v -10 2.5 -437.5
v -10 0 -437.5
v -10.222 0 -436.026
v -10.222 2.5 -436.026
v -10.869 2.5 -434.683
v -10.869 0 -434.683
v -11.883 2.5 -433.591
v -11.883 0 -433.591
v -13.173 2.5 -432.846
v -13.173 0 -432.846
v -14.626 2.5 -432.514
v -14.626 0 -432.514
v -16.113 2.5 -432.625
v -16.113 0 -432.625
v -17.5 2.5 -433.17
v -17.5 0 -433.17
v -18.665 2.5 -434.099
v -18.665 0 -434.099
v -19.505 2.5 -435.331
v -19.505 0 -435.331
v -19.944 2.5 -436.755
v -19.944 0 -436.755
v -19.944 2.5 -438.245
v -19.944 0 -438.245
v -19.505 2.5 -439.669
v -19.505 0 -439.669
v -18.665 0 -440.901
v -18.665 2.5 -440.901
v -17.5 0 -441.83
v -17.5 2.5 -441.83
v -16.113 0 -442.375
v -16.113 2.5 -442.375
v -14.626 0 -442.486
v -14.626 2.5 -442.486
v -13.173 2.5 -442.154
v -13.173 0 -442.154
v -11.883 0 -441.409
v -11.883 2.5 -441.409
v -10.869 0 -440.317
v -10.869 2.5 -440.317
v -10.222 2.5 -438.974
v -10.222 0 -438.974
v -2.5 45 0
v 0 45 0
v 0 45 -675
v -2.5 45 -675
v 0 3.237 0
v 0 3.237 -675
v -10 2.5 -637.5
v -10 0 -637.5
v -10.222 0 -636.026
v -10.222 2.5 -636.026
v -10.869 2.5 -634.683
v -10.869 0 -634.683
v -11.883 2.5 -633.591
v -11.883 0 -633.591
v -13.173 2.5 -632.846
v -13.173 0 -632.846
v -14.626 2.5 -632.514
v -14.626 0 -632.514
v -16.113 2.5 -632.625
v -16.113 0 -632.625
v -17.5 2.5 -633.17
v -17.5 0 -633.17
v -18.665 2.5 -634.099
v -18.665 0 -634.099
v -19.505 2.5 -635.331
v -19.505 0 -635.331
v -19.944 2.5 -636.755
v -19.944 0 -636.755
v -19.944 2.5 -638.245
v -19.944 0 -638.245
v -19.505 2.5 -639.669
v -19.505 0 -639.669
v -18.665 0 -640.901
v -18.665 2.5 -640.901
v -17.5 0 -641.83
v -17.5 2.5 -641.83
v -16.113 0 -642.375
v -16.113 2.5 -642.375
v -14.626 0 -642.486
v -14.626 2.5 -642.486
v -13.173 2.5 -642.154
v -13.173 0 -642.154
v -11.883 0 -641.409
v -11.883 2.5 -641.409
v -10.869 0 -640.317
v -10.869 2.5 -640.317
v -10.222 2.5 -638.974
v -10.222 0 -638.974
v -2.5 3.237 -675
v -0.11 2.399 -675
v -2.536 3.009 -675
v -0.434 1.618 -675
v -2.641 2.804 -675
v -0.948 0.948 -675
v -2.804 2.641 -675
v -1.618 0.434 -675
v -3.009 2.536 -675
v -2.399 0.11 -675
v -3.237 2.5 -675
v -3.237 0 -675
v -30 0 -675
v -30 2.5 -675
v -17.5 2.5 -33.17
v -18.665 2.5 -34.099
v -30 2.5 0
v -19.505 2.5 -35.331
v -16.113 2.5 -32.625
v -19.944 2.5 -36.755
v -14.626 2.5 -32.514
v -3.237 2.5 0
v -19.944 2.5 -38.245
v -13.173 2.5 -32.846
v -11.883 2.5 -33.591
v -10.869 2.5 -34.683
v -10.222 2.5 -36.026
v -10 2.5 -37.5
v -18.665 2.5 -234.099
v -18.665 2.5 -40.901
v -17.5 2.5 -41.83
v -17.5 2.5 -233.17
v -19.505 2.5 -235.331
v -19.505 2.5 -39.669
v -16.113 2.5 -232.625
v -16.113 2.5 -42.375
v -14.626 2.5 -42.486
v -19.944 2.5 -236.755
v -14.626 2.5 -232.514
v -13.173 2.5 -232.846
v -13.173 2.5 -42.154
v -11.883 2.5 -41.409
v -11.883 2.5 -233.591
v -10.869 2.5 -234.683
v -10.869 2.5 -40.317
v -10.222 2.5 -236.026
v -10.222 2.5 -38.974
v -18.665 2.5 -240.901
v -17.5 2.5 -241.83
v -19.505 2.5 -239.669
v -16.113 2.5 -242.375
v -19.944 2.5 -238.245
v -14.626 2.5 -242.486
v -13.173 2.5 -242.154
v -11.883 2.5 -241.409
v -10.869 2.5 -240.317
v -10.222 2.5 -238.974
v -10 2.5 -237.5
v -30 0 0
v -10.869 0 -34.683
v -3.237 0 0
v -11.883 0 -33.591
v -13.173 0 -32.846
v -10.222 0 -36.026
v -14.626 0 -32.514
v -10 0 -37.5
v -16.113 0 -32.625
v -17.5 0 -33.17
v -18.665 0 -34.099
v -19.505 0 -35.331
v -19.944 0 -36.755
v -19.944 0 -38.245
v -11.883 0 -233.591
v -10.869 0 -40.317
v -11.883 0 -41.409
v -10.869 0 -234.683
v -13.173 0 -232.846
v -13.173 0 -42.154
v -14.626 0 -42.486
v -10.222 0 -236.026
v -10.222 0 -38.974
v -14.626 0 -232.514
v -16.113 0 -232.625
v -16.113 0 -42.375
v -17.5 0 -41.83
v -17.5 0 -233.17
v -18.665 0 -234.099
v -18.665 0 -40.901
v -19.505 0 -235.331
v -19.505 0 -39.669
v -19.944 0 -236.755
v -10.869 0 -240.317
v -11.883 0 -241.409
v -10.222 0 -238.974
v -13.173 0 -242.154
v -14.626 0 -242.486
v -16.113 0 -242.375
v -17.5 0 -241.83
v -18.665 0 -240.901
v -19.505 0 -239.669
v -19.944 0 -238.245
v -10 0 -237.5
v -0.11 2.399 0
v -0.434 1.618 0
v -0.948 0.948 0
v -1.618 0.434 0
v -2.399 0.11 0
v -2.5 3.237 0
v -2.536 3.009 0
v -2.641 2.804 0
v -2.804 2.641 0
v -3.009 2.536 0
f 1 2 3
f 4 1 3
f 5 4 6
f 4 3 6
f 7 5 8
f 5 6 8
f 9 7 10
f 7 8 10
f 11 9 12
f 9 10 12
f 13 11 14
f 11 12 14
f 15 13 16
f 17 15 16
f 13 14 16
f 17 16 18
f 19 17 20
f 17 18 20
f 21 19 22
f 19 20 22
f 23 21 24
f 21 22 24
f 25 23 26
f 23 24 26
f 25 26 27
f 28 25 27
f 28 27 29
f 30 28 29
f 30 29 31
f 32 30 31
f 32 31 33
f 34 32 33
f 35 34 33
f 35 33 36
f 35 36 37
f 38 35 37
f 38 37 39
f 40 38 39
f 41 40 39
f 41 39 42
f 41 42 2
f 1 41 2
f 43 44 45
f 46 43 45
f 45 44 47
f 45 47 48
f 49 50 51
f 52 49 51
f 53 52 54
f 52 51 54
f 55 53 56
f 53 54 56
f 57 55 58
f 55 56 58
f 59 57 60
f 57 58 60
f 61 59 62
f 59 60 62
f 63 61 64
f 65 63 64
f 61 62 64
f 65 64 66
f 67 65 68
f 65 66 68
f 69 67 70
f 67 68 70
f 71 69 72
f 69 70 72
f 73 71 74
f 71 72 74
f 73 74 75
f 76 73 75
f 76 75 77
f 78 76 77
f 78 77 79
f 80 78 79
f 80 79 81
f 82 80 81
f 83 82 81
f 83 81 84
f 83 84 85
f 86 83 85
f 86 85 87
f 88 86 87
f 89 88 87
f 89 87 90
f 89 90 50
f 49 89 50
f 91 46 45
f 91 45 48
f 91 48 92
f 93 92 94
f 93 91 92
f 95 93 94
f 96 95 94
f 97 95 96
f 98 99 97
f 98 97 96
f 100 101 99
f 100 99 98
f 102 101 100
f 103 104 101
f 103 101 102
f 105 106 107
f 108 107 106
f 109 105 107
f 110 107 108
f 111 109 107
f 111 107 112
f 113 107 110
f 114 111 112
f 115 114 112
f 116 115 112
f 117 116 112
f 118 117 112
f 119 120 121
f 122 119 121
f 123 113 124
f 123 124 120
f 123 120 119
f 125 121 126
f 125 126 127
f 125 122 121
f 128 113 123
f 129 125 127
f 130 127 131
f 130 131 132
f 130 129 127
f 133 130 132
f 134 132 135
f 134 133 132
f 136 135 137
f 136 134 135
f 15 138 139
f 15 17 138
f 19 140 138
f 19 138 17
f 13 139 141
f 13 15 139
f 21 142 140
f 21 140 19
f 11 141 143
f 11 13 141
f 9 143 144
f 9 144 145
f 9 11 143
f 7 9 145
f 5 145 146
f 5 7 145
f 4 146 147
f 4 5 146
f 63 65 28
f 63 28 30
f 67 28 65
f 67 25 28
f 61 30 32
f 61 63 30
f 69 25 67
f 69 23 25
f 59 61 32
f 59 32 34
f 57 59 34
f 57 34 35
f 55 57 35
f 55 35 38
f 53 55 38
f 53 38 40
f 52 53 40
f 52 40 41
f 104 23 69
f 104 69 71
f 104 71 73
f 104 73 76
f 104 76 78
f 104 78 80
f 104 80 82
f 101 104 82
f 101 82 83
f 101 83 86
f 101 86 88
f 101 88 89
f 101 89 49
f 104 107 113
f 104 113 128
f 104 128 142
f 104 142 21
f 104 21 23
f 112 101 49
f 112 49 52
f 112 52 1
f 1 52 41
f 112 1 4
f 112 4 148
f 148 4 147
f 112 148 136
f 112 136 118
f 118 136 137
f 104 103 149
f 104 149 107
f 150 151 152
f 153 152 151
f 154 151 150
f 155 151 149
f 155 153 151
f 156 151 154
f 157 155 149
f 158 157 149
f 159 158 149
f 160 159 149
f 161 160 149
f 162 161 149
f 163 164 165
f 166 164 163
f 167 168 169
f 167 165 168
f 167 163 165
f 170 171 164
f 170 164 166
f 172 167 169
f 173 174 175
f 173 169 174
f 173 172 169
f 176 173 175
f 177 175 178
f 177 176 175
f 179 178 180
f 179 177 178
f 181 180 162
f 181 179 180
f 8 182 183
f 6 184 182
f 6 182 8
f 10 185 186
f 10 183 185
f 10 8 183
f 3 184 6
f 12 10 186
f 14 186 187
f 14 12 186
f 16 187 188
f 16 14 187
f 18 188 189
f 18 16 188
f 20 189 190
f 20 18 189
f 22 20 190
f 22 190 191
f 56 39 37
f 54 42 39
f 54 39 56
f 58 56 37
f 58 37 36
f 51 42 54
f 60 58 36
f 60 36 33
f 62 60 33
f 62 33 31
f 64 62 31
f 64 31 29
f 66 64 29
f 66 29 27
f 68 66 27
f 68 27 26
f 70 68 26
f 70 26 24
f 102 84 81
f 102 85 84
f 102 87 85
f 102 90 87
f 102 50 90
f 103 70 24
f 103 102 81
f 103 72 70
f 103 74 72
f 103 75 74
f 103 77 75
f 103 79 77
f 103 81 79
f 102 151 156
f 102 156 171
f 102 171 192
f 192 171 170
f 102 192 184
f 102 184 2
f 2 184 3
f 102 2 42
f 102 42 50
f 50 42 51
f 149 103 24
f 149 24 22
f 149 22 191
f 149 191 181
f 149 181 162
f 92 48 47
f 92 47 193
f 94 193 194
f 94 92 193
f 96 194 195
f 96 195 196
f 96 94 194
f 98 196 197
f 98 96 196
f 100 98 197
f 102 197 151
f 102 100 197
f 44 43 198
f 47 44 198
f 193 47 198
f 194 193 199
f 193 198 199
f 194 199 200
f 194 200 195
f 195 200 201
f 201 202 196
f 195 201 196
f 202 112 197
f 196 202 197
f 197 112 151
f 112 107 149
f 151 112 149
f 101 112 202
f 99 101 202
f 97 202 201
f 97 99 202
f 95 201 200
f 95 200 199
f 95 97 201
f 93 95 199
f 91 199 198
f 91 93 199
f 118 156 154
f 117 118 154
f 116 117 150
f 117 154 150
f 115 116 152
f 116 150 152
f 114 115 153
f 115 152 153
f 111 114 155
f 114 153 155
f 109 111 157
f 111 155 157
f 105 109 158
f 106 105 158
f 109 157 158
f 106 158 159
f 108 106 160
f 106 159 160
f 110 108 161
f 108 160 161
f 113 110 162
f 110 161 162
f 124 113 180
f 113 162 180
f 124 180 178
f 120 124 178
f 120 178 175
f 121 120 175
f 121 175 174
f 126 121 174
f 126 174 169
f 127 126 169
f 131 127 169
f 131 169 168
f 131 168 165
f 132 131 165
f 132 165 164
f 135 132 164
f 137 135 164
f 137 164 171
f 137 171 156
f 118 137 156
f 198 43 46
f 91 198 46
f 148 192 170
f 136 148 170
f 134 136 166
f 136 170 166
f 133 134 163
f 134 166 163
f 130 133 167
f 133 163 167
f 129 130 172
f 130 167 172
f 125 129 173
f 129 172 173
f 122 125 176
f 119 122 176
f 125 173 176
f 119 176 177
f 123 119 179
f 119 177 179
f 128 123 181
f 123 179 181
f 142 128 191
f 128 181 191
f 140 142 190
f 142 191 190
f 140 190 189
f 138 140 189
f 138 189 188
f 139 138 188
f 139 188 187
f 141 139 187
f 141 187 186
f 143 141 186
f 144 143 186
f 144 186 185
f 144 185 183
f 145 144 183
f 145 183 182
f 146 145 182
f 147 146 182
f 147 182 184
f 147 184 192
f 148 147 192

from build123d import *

# Parameters (mm, degrees)
SKETCH1_W                    = 675
SKETCH1_H                    = 45
BASE_FLANGE1_DEPTH           = 2.5
EDGE_FLANGE1_STRIP_W         = 11.4732
EDGE_FLANGE1_STRIP_H         = 2.5
EDGE_FLANGE1_STRIP_CUT_DEPTH = 675
EDGE_FLANGE1_DEPTH           = 675
SKETCH9_R                    = 5
CUT_EXTRUDE1_DEPTH           = 10
LPATTERN1_COUNT              = 4
LPATTERN1_PITCH              = 200


# Sheet-metal steps are written as plain solids
with BuildPart() as part:
    # Sketch1 → Base-Flange1 (new body)
    with BuildSketch(Plane(origin=(0, 0, 0), x_dir=(0, 0, -1), z_dir=(1, 0, 0))):
        with Locations((337.5, 22.5)):
            Rectangle(SKETCH1_W, SKETCH1_H)
    extrude(amount=-BASE_FLANGE1_DEPTH)

    # Edge-Flange1 strip (across the edge) → Edge-Flange1 strip cut (cut)
    with BuildSketch(Plane(origin=(-2.5, 0, -675), x_dir=(0, 1, 0), z_dir=(0, 0, 1))):
        with Locations((-2.5, -1.25)):
            Rectangle(EDGE_FLANGE1_STRIP_W, EDGE_FLANGE1_STRIP_H)
    extrude(amount=EDGE_FLANGE1_STRIP_CUT_DEPTH, mode=Mode.SUBTRACT)

    # Edge-Flange1 section (across the edge) → Edge-Flange1 (add)
    with BuildSketch(Plane(origin=(-2.5, 0, -675), x_dir=(0, 1, 0), z_dir=(0, 0, 1))):
        with BuildLine():
            Line((0, 0.7366), (0, 27.5))
            Line((0, 27.5), (2.5, 27.5))
            Line((2.5, 27.5), (2.5, 0.7366))
            ThreePointArc((2.5, 0.7366), (2.715745145, 0.215745145), (3.2366, 0))
            Line((3.2366, 0), (3.2366, -2.5))
            ThreePointArc((3.2366, -2.5), (0.947978192, -1.552021808), (0, 0.7366))
        make_face()
    extrude(amount=EDGE_FLANGE1_DEPTH)

    # Sketch9 → Cut-Extrude1 (cut)
    with BuildSketch(Plane(origin=(0, 0, 0), x_dir=(-1, 0, 0), z_dir=(0, -1, 0))):
        with Locations(Location((15, 637.5, 0), (0, 0, 180))):
            Circle(SKETCH9_R)
    cut_extrude1 = extrude(amount=-CUT_EXTRUDE1_DEPTH, mode=Mode.SUBTRACT)

    # LPattern1: Cut-Extrude1 ×4
    with Locations(*[(0, 0, i * LPATTERN1_PITCH) for i in range(1, LPATTERN1_COUNT)]):
        add(cut_extrude1, mode=Mode.SUBTRACT)


solid = part.part
